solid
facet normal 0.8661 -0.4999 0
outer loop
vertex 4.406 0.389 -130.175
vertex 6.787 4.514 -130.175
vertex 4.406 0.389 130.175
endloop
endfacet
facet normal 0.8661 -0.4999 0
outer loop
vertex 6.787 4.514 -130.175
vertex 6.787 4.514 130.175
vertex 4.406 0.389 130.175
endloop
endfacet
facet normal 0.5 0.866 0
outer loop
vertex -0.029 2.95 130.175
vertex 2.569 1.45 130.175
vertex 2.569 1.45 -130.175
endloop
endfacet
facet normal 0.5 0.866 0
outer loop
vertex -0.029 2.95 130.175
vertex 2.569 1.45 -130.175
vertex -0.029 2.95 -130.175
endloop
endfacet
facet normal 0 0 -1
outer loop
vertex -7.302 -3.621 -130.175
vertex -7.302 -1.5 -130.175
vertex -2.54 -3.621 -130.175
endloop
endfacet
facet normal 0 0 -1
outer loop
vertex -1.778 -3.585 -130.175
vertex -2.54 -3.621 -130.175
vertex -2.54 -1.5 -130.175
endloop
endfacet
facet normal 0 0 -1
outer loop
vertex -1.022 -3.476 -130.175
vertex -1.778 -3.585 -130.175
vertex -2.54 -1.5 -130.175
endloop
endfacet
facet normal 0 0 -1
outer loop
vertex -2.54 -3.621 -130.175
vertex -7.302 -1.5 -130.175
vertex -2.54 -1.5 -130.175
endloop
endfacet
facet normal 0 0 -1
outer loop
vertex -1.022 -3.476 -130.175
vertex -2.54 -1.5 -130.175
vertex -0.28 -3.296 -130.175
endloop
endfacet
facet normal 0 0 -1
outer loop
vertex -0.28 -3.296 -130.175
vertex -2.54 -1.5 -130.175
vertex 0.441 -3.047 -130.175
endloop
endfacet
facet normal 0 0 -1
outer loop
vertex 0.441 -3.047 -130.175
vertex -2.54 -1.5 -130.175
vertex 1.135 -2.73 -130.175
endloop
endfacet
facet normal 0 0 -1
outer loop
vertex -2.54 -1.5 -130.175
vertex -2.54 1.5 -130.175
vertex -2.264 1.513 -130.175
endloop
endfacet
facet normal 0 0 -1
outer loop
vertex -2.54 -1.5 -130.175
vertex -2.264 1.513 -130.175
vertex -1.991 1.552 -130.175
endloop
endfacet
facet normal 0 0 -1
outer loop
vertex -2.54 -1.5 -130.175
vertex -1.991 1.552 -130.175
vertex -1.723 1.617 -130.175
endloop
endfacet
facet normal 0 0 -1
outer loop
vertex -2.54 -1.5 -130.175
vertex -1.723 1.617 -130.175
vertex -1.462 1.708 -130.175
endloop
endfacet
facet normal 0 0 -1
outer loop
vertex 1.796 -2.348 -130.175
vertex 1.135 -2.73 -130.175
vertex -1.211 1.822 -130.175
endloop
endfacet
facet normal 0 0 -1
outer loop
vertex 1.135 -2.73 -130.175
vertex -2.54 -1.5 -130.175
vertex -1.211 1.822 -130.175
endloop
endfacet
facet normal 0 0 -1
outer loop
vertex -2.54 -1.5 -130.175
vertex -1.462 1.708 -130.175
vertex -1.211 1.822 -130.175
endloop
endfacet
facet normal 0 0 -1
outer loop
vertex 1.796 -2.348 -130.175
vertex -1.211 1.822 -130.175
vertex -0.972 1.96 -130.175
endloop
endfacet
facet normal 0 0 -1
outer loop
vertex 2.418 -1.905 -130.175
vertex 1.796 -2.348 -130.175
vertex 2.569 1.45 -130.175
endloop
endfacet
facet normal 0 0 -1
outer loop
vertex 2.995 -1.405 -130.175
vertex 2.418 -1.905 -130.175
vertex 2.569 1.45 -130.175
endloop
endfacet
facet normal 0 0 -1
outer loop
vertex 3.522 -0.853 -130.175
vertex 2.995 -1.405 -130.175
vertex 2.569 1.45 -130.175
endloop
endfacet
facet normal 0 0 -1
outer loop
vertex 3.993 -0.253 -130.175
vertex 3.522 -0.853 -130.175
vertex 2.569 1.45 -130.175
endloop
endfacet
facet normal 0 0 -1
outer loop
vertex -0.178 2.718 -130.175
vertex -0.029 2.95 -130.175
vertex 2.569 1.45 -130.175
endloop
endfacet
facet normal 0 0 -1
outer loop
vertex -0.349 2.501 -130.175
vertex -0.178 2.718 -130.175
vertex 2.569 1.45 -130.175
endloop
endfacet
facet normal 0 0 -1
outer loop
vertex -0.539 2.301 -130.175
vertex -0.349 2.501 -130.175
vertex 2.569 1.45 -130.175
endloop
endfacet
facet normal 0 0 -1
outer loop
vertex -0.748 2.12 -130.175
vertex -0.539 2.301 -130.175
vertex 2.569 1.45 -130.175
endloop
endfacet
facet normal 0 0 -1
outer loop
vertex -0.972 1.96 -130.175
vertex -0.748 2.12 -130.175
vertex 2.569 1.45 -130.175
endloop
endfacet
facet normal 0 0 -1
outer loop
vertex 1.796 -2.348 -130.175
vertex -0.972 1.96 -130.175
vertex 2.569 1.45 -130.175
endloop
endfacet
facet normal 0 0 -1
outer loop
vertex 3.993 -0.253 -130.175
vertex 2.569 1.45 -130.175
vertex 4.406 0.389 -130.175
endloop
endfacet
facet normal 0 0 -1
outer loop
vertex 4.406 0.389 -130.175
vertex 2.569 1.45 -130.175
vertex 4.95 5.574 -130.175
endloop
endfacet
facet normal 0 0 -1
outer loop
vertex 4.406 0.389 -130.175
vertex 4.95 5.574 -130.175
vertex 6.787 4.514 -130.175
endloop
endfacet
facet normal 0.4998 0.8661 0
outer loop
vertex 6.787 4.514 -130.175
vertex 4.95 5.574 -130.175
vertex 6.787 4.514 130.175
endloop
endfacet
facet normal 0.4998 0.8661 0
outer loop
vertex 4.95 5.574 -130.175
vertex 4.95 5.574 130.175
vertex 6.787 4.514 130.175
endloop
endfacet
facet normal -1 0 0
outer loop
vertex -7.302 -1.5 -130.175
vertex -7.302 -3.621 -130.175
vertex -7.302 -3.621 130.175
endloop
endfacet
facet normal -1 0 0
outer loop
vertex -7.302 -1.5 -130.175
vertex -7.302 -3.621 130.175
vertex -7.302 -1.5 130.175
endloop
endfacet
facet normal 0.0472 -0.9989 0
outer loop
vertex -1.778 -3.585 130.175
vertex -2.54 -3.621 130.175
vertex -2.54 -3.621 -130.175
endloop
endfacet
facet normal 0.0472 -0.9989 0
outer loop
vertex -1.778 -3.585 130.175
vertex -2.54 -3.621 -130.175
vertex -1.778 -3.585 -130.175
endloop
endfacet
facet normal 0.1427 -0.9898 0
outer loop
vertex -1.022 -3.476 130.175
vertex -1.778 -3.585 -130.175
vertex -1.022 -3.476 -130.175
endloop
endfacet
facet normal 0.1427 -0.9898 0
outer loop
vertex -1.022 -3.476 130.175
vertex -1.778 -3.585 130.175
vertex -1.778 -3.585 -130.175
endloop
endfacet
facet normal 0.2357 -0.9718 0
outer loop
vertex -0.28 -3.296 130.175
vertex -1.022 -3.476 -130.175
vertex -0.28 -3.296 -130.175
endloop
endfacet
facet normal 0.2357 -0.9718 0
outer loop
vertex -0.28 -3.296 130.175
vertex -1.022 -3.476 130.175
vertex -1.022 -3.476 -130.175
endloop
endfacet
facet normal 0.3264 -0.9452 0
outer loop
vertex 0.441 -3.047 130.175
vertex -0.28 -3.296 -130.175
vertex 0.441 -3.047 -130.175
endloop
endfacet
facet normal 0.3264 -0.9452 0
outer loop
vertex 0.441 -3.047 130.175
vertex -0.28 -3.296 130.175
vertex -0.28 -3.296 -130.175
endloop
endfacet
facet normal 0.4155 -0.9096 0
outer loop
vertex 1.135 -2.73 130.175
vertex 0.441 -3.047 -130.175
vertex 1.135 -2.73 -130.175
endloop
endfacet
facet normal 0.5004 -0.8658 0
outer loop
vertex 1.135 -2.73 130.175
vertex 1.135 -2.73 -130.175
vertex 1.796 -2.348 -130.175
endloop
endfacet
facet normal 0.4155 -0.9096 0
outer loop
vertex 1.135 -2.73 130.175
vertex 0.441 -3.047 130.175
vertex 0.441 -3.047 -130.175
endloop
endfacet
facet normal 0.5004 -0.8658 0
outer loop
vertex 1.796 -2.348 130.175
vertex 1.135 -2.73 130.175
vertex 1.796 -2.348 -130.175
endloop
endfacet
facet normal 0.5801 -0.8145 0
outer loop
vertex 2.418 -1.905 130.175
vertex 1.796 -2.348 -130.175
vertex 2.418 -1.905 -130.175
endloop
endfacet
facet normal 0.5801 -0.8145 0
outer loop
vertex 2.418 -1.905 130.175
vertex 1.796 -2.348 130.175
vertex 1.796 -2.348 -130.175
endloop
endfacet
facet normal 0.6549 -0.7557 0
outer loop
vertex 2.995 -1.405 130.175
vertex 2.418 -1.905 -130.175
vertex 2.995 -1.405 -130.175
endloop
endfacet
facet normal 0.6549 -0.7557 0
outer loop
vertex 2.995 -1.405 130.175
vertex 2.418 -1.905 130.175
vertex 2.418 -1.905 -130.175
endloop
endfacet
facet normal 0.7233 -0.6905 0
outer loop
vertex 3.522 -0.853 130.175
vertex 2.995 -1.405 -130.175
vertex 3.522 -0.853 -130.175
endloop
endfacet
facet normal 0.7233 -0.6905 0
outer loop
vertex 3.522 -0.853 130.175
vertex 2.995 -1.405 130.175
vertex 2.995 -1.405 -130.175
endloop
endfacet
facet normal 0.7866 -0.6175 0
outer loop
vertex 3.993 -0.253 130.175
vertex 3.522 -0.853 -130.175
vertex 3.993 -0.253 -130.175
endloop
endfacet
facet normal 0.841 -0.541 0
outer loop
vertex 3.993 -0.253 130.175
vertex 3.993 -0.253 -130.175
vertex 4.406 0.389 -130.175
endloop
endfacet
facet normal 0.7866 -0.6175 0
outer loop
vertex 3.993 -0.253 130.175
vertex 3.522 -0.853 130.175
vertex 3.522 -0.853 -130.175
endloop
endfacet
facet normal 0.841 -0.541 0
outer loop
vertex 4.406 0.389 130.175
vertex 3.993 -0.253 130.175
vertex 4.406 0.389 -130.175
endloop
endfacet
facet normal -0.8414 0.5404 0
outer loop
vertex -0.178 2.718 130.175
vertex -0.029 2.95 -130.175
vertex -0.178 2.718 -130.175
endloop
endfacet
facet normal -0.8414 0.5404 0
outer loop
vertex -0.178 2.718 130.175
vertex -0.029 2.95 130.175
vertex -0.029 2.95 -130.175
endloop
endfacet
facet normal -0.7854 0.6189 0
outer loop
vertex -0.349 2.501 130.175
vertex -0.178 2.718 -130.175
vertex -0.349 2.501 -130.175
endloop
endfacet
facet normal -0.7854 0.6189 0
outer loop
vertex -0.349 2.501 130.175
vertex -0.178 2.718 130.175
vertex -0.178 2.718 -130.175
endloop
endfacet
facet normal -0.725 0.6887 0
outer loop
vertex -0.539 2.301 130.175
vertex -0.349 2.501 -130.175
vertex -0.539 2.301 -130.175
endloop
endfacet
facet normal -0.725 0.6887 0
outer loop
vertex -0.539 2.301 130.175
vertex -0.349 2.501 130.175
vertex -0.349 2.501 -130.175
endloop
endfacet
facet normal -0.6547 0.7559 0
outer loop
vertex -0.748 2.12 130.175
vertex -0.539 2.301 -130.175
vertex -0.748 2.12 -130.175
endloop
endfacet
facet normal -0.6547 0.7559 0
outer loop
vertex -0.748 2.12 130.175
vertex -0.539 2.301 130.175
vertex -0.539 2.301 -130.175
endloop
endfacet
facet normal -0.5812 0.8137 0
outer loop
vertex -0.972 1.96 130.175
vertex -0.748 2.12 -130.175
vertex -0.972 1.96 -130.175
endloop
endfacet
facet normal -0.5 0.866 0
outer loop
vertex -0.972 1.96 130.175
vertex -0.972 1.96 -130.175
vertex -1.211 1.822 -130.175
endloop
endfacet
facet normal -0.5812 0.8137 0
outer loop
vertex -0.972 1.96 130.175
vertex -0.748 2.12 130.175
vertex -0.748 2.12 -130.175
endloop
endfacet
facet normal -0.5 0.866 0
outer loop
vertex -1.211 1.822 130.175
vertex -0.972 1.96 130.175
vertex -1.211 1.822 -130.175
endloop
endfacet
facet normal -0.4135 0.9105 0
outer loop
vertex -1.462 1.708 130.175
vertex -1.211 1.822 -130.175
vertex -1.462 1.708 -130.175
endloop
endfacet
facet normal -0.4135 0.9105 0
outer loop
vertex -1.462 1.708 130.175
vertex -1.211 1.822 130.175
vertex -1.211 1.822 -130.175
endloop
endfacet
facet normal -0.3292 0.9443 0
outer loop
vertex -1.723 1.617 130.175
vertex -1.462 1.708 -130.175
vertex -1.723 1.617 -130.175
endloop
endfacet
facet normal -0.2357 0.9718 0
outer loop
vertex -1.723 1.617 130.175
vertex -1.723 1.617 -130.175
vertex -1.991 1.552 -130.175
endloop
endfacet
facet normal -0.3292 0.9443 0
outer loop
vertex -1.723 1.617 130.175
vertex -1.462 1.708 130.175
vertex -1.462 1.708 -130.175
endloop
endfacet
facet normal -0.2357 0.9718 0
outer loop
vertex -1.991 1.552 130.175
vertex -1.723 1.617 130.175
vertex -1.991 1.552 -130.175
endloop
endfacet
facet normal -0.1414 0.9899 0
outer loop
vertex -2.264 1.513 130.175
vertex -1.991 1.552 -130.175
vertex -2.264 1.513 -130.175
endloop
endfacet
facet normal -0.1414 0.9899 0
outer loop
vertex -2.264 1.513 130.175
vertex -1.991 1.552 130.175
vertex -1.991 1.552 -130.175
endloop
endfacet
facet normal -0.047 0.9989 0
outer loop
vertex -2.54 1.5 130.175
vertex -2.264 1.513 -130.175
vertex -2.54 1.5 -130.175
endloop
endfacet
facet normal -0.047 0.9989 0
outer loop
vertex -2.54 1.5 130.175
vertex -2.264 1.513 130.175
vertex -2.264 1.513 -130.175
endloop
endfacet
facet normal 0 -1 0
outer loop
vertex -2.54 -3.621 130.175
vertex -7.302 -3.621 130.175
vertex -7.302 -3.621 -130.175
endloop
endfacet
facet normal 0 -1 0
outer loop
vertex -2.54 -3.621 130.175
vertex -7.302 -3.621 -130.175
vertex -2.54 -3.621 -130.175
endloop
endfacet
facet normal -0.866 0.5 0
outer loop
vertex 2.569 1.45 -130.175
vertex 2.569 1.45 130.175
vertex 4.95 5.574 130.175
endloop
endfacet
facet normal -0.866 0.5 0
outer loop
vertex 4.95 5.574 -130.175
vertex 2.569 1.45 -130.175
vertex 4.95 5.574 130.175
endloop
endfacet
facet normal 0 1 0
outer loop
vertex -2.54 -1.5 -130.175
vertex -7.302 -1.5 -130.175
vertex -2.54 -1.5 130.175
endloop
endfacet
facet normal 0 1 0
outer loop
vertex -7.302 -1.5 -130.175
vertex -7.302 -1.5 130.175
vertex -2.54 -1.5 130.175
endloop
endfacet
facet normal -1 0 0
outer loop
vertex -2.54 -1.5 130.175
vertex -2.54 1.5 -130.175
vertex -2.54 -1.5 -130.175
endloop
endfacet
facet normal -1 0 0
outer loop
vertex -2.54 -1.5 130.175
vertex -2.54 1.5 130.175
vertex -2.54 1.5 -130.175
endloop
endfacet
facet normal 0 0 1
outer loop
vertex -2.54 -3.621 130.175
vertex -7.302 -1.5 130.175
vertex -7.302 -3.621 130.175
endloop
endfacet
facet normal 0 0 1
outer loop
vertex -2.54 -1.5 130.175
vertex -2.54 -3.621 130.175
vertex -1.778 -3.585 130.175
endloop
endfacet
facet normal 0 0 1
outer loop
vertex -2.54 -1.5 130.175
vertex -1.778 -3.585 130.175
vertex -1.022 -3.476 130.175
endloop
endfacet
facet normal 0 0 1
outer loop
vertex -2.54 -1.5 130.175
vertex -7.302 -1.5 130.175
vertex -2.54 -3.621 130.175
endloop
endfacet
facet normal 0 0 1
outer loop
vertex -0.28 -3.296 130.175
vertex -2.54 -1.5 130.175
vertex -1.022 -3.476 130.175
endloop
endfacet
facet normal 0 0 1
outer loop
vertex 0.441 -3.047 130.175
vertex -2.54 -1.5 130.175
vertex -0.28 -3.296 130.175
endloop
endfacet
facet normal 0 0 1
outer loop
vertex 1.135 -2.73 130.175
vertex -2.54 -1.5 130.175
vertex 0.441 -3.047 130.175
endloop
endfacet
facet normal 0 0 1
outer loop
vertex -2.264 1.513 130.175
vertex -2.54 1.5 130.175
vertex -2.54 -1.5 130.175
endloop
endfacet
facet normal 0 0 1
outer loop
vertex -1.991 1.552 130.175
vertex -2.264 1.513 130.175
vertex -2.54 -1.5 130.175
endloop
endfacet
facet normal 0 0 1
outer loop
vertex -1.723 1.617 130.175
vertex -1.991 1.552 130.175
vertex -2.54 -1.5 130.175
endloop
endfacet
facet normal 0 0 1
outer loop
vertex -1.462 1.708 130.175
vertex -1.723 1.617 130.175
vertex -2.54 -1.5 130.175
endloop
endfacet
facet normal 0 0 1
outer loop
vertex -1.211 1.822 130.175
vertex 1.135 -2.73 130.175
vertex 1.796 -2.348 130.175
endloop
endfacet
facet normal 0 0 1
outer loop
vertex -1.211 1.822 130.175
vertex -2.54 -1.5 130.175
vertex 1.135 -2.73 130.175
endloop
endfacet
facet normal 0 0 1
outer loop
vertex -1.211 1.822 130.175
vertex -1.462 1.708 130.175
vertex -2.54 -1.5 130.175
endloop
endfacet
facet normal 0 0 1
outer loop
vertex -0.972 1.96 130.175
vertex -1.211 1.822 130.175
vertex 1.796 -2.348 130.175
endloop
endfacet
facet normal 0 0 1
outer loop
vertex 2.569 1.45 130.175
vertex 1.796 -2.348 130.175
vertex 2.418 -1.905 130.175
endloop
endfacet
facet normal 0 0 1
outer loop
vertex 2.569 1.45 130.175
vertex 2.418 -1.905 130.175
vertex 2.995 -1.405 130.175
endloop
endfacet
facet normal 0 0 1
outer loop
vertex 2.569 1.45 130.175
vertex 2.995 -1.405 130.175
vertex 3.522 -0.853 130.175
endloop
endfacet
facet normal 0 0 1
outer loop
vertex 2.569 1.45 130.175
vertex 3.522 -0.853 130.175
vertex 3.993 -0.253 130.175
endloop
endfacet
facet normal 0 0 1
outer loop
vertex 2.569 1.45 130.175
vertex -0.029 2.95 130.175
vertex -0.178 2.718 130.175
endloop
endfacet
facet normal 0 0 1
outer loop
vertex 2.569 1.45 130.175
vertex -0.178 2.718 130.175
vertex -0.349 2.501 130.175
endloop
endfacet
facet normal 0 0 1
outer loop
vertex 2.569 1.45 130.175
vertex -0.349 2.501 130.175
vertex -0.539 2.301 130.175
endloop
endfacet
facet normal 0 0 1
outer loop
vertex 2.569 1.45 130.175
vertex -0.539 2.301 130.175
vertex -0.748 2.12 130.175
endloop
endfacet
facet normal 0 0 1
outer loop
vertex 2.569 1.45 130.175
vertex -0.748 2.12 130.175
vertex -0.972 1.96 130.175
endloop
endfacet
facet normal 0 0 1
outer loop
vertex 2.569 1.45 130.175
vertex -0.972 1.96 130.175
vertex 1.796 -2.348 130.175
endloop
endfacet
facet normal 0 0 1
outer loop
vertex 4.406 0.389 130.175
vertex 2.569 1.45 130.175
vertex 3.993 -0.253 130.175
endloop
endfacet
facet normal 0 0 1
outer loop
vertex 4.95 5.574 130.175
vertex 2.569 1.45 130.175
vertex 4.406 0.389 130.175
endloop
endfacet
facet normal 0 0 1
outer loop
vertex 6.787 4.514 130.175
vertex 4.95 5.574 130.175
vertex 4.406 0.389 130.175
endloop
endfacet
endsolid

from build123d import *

# Parameters (mm, degrees)
SKETCH7_W           = 4.7625
SKETCH7_H           = 2.12122512
BOSS_EXTRUDE2_DEPTH = 130.175
BOSS_EXTRUDE3_DEPTH = 130.175
BOSS_EXTRUDE4_DEPTH = 130.175


with BuildPart() as part:
    # Sketch7 → Boss-Extrude2 (new, symmetric)
    with BuildSketch(Plane.XY):
        with Locations((-4.92125, -2.560612608)):
            Rectangle(SKETCH7_W, SKETCH7_H)
    extrude(amount=BOSS_EXTRUDE2_DEPTH, both=True)



with BuildPart() as body_2:
    # Sketch8 → Boss-Extrude3 (new, symmetric)
    with BuildSketch(Plane.XY):
        Polygon((2.569038147, 1.449704502), (4.950288147, 5.574150487), (6.787322988, 4.513537927), (4.406072988, 0.389091942), align=None)
    extrude(amount=BOSS_EXTRUDE3_DEPTH, both=True)


with BuildPart() as part_1:
    add(part.part)

    add(body_2.part)  # Boss-Extrude4 merges body 2
    # Sketch11 → Boss-Extrude4 (add, symmetric)
    with BuildSketch(Plane.XY):
        with BuildLine():
            Line((-2.54, -1.500000048), (-7.3025, -1.500000048))
            Line((-7.3025, -1.500000048), (-7.3025, -3.621225168))
            Line((-7.3025, -3.621225168), (-2.54, -3.621225168))
            ThreePointArc((-2.54, -3.621225168), (1.47031711, -2.546663937), (4.406072988, 0.389091942))
            Line((4.406072988, 0.389091942), (6.787322988, 4.513537927))
            Line((6.787322988, 4.513537927), (4.950288147, 5.574150487))
            Line((4.950288147, 5.574150487), (2.569038147, 1.449704502))
            Line((2.569038147, 1.449704502), (-0.029038147, 2.94970455))
            ThreePointArc((-0.029038147, 2.94970455), (-1.090295498, 1.888447198), (-2.54, 1.500000048))
            Line((-2.54, 1.500000048), (-2.54, -1.500000048))
        make_face()
    extrude(amount=BOSS_EXTRUDE4_DEPTH, both=True)


solid = part_1.part
